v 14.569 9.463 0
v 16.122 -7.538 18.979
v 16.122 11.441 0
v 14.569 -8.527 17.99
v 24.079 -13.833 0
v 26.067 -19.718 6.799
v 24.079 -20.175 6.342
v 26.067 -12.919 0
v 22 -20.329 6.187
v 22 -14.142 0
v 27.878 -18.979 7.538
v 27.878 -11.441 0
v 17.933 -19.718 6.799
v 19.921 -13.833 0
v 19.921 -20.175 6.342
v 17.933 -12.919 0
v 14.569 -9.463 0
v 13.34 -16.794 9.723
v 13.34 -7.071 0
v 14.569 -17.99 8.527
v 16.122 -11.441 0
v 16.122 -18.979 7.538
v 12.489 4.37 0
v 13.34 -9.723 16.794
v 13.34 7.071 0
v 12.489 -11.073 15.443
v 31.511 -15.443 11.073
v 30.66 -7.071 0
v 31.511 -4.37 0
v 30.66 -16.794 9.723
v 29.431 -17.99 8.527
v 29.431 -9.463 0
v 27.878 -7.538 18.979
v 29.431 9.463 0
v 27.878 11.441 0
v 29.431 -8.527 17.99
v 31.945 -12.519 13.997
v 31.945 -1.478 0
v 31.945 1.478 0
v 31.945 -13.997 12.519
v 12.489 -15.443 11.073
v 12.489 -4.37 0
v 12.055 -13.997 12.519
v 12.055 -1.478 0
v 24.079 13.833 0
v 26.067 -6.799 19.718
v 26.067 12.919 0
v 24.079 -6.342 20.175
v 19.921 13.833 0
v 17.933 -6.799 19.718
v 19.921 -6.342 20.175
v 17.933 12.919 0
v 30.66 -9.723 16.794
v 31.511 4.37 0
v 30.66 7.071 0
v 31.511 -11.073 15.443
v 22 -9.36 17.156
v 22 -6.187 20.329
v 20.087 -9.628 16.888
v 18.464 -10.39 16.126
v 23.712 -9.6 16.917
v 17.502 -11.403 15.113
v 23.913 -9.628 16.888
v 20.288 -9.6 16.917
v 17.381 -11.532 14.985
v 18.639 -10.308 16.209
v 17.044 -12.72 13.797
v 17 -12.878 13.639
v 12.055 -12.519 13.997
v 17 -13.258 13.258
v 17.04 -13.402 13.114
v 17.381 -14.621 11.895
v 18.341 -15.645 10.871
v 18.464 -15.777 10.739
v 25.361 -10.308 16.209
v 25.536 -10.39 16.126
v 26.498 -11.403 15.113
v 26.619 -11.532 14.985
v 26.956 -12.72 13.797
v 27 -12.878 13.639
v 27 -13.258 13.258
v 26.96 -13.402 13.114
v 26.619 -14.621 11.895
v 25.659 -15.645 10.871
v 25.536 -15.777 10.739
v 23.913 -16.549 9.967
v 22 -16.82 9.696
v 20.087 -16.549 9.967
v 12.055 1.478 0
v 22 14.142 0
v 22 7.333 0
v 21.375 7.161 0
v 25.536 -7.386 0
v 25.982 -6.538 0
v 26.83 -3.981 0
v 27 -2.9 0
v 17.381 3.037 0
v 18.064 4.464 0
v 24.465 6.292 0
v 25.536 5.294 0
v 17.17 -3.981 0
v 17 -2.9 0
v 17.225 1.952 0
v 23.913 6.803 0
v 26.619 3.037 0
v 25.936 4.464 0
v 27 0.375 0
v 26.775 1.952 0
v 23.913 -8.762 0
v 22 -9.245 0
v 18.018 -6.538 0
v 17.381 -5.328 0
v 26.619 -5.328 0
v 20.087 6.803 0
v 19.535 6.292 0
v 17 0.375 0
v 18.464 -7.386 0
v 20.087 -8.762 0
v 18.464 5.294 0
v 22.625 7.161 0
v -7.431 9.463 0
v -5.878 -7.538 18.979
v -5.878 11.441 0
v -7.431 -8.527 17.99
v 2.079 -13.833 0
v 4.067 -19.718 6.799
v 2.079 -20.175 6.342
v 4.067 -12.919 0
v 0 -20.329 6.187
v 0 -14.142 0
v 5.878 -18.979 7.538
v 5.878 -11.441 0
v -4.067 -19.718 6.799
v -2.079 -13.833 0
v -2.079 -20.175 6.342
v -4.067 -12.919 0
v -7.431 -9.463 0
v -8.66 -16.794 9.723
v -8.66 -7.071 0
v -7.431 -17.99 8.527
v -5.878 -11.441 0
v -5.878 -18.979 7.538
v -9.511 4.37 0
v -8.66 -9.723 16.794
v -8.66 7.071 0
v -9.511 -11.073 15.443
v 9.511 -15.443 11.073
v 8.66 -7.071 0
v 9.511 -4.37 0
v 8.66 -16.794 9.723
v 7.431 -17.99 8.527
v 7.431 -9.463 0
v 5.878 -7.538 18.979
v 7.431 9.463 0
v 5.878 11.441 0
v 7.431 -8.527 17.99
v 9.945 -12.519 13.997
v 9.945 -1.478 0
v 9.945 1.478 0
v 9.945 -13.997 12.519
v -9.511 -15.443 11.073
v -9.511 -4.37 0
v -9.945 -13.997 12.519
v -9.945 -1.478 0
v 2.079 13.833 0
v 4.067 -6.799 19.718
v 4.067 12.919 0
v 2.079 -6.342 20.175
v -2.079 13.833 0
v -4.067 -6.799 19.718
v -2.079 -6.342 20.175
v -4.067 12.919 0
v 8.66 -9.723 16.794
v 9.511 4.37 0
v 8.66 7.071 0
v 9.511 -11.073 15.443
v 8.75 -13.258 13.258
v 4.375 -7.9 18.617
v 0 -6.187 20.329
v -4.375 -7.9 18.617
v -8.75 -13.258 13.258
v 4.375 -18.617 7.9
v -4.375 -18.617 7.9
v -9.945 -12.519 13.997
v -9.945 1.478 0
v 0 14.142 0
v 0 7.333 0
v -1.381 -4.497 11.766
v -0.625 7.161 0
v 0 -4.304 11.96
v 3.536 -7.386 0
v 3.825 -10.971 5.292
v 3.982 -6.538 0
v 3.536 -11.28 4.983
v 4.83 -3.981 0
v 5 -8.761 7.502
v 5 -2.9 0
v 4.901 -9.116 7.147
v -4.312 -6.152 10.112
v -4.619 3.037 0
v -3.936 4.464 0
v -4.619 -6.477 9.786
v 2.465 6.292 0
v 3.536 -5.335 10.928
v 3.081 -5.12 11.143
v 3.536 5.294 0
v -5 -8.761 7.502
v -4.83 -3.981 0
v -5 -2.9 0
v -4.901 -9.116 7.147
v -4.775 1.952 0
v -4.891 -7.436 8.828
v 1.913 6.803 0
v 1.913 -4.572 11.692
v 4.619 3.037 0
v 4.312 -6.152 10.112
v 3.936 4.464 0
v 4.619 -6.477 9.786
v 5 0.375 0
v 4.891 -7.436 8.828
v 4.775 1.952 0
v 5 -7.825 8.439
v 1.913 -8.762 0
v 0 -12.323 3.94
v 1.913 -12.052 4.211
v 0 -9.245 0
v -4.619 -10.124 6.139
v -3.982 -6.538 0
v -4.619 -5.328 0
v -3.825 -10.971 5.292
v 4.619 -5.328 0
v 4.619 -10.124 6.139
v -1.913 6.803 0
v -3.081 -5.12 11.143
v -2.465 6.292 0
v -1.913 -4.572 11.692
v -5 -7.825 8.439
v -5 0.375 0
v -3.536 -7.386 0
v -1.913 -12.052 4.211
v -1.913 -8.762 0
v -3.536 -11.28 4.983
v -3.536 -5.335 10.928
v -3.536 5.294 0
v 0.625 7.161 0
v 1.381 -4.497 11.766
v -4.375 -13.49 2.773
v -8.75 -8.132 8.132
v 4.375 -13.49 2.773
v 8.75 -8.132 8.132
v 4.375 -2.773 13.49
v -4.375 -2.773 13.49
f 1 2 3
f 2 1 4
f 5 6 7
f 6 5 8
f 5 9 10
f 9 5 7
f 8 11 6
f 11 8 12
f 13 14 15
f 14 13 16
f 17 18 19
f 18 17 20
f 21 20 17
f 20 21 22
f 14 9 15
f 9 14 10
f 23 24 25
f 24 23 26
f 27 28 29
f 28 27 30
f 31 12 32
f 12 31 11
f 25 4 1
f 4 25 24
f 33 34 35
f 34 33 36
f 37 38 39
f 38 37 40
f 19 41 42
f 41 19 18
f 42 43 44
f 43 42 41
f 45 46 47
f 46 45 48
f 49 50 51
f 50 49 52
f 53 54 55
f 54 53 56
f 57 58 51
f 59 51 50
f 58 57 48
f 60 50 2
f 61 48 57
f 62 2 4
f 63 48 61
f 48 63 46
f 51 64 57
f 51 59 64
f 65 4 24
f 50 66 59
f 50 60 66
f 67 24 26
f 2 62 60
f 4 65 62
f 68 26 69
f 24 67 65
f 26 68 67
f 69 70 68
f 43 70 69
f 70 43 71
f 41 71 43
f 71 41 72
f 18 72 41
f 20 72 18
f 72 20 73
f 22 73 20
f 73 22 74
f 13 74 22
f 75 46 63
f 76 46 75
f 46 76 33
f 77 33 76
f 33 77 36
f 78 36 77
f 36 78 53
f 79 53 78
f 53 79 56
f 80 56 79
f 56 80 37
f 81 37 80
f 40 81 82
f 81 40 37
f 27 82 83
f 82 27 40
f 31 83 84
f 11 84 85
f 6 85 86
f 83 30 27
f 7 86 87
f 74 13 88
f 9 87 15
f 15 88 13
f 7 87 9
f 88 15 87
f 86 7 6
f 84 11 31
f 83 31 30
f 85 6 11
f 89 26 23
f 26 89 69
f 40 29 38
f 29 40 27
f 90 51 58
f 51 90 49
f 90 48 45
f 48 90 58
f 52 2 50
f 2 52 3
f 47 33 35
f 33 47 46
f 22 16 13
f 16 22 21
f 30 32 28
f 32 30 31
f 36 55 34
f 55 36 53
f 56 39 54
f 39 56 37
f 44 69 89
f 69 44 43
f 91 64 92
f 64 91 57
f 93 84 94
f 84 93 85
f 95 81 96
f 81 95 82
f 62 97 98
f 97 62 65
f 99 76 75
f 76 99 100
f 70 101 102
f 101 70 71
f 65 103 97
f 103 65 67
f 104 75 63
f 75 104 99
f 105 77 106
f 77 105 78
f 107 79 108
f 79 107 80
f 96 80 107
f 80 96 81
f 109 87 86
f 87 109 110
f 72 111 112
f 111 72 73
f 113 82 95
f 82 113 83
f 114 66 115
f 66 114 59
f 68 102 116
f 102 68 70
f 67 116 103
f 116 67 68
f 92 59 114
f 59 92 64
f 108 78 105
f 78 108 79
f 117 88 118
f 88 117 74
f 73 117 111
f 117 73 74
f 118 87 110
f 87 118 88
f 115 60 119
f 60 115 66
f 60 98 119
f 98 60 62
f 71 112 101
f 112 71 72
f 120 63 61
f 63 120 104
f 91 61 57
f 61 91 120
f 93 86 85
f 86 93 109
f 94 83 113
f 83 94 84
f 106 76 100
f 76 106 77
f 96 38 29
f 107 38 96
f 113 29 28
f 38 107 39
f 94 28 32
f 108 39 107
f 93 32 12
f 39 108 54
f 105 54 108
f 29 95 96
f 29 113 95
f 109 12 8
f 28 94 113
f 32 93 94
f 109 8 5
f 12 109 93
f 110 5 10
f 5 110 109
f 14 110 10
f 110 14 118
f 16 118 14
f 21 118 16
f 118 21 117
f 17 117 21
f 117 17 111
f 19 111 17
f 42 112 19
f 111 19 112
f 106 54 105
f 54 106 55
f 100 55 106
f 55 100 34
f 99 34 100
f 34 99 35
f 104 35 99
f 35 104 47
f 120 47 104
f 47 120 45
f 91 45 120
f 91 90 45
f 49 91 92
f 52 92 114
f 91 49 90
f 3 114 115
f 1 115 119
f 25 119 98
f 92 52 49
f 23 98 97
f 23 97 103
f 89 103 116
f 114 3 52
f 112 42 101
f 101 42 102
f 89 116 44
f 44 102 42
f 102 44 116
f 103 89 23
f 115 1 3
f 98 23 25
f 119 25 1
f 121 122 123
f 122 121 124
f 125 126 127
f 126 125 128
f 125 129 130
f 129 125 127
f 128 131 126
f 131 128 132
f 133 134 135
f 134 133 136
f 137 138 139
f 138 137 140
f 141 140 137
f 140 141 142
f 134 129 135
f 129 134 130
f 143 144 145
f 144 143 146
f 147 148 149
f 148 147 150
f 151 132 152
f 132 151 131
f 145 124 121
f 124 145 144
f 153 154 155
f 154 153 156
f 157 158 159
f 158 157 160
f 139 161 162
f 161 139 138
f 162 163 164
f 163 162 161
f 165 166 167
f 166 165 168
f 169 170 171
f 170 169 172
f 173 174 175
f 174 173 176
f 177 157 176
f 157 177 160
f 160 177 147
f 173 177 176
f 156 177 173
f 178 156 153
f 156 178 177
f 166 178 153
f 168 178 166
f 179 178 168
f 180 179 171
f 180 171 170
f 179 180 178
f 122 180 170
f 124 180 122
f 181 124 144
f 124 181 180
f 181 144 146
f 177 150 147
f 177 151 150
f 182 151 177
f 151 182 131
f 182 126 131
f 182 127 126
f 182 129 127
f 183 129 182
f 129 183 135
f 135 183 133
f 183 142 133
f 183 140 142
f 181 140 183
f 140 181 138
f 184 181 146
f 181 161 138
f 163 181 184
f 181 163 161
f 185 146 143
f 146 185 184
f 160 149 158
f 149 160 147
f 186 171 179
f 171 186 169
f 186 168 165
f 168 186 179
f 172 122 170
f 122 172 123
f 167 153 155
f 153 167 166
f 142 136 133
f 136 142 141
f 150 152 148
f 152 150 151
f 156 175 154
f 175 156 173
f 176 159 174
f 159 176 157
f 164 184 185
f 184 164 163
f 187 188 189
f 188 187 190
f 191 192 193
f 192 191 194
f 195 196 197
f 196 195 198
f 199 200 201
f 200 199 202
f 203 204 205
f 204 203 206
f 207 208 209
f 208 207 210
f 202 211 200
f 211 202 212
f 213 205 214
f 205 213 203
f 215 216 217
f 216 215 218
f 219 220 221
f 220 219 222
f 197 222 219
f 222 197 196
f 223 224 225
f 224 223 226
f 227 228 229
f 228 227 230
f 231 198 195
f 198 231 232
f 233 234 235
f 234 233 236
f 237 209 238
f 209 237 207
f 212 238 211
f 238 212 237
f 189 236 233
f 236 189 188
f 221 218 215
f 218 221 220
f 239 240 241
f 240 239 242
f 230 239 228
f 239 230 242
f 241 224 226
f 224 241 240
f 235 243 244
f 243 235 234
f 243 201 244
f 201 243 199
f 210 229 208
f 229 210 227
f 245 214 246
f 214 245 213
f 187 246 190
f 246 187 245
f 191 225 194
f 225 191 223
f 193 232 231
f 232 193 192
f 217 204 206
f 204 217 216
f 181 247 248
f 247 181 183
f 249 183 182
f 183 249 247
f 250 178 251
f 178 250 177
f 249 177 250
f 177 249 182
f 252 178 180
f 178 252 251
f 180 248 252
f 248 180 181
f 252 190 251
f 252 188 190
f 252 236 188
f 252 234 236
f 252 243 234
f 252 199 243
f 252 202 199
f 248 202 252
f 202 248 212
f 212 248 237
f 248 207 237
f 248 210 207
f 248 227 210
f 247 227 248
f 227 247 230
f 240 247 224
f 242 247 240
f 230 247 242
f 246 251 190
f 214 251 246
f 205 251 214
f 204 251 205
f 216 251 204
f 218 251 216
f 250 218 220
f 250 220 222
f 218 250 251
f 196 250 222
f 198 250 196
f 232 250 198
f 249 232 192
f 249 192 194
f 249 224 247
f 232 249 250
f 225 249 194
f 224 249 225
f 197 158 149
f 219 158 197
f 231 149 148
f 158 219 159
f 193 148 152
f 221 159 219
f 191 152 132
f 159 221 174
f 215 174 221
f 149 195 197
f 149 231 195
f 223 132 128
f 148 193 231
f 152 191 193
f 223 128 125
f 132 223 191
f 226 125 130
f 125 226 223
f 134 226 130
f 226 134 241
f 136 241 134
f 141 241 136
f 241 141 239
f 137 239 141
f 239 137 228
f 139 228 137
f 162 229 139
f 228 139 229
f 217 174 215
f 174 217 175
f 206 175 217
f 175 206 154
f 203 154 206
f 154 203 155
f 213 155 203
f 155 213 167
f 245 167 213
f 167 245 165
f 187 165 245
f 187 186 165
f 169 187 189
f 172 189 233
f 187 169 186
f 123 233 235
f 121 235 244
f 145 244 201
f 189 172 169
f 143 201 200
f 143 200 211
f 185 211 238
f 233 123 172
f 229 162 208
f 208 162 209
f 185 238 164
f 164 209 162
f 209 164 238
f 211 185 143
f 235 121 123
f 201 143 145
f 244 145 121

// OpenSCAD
//Diameter of the wedge, make this slightly smaller than the inner diameter of your tube.
outer_diameter = 20; 

//Diameter of the bolt hole, make this slightly larger than the diameter of your bolt.
core_diameter = 10; 

//Diameter of the nut socket, make this slightly larger than the nut measured point to point (not the flats). 
nut_diameter = 17.5;

/* [Hidden] */

flare_angle = 7;
nut_seat = 1.5;

outer_radius = outer_diameter / 2;
core_radius = core_diameter / 2;
nut_radius = nut_diameter / 2;
center_height = outer_radius + nut_diameter / 2;
double_height = center_height * 2;

module wedge(has_nut) {

	module flared_cyl() {
	
		module cyl(height) {
			translate([0, 0, -center_height]) {
				cylinder(r = core_radius, h = height, center = true);
			}
		}

		translate([0, 0, center_height]) {
			hull() {
				cyl(double_height);
				rotate([0, -flare_angle, 0]) {
					cyl(double_height + outer_radius);
				}
			}
		}
	}

	intersection() {
		translate([-double_height, -outer_radius, 0]) {
			cube([2 * double_height, outer_diameter, double_height]);
		}
		rotate([0, 45, 0]) {
			difference() {
				cylinder(r = outer_radius, h = double_height, center = true);
				flared_cyl();

				if (has_nut) {
					translate([0, 0, outer_radius + nut_seat]) {
						nut();
					}
				}

			}
		}
	}
}

module nut() {
	rotate([0, 0, 30]) {
		cylinder(r = nut_radius, h = center_height, $fn = 6, center = false);
	}
}

module main() {
	rotate([0, 0, -90]) {
		translate([0, outer_diameter + 2, 0]) {
			wedge(false);
		}

		wedge(true);
	}
}

if (core_diameter >= outer_diameter) {
	echo("core diameter must be less than outer diameter.");
} else if (nut_diameter >= outer_diameter) {
	echo("nut diameter must be less than outer diameter.");
} else if (core_diameter >= nut_diameter) {
	echo("core diameter must be less than nut diameter.");
} else {
	main();
}
